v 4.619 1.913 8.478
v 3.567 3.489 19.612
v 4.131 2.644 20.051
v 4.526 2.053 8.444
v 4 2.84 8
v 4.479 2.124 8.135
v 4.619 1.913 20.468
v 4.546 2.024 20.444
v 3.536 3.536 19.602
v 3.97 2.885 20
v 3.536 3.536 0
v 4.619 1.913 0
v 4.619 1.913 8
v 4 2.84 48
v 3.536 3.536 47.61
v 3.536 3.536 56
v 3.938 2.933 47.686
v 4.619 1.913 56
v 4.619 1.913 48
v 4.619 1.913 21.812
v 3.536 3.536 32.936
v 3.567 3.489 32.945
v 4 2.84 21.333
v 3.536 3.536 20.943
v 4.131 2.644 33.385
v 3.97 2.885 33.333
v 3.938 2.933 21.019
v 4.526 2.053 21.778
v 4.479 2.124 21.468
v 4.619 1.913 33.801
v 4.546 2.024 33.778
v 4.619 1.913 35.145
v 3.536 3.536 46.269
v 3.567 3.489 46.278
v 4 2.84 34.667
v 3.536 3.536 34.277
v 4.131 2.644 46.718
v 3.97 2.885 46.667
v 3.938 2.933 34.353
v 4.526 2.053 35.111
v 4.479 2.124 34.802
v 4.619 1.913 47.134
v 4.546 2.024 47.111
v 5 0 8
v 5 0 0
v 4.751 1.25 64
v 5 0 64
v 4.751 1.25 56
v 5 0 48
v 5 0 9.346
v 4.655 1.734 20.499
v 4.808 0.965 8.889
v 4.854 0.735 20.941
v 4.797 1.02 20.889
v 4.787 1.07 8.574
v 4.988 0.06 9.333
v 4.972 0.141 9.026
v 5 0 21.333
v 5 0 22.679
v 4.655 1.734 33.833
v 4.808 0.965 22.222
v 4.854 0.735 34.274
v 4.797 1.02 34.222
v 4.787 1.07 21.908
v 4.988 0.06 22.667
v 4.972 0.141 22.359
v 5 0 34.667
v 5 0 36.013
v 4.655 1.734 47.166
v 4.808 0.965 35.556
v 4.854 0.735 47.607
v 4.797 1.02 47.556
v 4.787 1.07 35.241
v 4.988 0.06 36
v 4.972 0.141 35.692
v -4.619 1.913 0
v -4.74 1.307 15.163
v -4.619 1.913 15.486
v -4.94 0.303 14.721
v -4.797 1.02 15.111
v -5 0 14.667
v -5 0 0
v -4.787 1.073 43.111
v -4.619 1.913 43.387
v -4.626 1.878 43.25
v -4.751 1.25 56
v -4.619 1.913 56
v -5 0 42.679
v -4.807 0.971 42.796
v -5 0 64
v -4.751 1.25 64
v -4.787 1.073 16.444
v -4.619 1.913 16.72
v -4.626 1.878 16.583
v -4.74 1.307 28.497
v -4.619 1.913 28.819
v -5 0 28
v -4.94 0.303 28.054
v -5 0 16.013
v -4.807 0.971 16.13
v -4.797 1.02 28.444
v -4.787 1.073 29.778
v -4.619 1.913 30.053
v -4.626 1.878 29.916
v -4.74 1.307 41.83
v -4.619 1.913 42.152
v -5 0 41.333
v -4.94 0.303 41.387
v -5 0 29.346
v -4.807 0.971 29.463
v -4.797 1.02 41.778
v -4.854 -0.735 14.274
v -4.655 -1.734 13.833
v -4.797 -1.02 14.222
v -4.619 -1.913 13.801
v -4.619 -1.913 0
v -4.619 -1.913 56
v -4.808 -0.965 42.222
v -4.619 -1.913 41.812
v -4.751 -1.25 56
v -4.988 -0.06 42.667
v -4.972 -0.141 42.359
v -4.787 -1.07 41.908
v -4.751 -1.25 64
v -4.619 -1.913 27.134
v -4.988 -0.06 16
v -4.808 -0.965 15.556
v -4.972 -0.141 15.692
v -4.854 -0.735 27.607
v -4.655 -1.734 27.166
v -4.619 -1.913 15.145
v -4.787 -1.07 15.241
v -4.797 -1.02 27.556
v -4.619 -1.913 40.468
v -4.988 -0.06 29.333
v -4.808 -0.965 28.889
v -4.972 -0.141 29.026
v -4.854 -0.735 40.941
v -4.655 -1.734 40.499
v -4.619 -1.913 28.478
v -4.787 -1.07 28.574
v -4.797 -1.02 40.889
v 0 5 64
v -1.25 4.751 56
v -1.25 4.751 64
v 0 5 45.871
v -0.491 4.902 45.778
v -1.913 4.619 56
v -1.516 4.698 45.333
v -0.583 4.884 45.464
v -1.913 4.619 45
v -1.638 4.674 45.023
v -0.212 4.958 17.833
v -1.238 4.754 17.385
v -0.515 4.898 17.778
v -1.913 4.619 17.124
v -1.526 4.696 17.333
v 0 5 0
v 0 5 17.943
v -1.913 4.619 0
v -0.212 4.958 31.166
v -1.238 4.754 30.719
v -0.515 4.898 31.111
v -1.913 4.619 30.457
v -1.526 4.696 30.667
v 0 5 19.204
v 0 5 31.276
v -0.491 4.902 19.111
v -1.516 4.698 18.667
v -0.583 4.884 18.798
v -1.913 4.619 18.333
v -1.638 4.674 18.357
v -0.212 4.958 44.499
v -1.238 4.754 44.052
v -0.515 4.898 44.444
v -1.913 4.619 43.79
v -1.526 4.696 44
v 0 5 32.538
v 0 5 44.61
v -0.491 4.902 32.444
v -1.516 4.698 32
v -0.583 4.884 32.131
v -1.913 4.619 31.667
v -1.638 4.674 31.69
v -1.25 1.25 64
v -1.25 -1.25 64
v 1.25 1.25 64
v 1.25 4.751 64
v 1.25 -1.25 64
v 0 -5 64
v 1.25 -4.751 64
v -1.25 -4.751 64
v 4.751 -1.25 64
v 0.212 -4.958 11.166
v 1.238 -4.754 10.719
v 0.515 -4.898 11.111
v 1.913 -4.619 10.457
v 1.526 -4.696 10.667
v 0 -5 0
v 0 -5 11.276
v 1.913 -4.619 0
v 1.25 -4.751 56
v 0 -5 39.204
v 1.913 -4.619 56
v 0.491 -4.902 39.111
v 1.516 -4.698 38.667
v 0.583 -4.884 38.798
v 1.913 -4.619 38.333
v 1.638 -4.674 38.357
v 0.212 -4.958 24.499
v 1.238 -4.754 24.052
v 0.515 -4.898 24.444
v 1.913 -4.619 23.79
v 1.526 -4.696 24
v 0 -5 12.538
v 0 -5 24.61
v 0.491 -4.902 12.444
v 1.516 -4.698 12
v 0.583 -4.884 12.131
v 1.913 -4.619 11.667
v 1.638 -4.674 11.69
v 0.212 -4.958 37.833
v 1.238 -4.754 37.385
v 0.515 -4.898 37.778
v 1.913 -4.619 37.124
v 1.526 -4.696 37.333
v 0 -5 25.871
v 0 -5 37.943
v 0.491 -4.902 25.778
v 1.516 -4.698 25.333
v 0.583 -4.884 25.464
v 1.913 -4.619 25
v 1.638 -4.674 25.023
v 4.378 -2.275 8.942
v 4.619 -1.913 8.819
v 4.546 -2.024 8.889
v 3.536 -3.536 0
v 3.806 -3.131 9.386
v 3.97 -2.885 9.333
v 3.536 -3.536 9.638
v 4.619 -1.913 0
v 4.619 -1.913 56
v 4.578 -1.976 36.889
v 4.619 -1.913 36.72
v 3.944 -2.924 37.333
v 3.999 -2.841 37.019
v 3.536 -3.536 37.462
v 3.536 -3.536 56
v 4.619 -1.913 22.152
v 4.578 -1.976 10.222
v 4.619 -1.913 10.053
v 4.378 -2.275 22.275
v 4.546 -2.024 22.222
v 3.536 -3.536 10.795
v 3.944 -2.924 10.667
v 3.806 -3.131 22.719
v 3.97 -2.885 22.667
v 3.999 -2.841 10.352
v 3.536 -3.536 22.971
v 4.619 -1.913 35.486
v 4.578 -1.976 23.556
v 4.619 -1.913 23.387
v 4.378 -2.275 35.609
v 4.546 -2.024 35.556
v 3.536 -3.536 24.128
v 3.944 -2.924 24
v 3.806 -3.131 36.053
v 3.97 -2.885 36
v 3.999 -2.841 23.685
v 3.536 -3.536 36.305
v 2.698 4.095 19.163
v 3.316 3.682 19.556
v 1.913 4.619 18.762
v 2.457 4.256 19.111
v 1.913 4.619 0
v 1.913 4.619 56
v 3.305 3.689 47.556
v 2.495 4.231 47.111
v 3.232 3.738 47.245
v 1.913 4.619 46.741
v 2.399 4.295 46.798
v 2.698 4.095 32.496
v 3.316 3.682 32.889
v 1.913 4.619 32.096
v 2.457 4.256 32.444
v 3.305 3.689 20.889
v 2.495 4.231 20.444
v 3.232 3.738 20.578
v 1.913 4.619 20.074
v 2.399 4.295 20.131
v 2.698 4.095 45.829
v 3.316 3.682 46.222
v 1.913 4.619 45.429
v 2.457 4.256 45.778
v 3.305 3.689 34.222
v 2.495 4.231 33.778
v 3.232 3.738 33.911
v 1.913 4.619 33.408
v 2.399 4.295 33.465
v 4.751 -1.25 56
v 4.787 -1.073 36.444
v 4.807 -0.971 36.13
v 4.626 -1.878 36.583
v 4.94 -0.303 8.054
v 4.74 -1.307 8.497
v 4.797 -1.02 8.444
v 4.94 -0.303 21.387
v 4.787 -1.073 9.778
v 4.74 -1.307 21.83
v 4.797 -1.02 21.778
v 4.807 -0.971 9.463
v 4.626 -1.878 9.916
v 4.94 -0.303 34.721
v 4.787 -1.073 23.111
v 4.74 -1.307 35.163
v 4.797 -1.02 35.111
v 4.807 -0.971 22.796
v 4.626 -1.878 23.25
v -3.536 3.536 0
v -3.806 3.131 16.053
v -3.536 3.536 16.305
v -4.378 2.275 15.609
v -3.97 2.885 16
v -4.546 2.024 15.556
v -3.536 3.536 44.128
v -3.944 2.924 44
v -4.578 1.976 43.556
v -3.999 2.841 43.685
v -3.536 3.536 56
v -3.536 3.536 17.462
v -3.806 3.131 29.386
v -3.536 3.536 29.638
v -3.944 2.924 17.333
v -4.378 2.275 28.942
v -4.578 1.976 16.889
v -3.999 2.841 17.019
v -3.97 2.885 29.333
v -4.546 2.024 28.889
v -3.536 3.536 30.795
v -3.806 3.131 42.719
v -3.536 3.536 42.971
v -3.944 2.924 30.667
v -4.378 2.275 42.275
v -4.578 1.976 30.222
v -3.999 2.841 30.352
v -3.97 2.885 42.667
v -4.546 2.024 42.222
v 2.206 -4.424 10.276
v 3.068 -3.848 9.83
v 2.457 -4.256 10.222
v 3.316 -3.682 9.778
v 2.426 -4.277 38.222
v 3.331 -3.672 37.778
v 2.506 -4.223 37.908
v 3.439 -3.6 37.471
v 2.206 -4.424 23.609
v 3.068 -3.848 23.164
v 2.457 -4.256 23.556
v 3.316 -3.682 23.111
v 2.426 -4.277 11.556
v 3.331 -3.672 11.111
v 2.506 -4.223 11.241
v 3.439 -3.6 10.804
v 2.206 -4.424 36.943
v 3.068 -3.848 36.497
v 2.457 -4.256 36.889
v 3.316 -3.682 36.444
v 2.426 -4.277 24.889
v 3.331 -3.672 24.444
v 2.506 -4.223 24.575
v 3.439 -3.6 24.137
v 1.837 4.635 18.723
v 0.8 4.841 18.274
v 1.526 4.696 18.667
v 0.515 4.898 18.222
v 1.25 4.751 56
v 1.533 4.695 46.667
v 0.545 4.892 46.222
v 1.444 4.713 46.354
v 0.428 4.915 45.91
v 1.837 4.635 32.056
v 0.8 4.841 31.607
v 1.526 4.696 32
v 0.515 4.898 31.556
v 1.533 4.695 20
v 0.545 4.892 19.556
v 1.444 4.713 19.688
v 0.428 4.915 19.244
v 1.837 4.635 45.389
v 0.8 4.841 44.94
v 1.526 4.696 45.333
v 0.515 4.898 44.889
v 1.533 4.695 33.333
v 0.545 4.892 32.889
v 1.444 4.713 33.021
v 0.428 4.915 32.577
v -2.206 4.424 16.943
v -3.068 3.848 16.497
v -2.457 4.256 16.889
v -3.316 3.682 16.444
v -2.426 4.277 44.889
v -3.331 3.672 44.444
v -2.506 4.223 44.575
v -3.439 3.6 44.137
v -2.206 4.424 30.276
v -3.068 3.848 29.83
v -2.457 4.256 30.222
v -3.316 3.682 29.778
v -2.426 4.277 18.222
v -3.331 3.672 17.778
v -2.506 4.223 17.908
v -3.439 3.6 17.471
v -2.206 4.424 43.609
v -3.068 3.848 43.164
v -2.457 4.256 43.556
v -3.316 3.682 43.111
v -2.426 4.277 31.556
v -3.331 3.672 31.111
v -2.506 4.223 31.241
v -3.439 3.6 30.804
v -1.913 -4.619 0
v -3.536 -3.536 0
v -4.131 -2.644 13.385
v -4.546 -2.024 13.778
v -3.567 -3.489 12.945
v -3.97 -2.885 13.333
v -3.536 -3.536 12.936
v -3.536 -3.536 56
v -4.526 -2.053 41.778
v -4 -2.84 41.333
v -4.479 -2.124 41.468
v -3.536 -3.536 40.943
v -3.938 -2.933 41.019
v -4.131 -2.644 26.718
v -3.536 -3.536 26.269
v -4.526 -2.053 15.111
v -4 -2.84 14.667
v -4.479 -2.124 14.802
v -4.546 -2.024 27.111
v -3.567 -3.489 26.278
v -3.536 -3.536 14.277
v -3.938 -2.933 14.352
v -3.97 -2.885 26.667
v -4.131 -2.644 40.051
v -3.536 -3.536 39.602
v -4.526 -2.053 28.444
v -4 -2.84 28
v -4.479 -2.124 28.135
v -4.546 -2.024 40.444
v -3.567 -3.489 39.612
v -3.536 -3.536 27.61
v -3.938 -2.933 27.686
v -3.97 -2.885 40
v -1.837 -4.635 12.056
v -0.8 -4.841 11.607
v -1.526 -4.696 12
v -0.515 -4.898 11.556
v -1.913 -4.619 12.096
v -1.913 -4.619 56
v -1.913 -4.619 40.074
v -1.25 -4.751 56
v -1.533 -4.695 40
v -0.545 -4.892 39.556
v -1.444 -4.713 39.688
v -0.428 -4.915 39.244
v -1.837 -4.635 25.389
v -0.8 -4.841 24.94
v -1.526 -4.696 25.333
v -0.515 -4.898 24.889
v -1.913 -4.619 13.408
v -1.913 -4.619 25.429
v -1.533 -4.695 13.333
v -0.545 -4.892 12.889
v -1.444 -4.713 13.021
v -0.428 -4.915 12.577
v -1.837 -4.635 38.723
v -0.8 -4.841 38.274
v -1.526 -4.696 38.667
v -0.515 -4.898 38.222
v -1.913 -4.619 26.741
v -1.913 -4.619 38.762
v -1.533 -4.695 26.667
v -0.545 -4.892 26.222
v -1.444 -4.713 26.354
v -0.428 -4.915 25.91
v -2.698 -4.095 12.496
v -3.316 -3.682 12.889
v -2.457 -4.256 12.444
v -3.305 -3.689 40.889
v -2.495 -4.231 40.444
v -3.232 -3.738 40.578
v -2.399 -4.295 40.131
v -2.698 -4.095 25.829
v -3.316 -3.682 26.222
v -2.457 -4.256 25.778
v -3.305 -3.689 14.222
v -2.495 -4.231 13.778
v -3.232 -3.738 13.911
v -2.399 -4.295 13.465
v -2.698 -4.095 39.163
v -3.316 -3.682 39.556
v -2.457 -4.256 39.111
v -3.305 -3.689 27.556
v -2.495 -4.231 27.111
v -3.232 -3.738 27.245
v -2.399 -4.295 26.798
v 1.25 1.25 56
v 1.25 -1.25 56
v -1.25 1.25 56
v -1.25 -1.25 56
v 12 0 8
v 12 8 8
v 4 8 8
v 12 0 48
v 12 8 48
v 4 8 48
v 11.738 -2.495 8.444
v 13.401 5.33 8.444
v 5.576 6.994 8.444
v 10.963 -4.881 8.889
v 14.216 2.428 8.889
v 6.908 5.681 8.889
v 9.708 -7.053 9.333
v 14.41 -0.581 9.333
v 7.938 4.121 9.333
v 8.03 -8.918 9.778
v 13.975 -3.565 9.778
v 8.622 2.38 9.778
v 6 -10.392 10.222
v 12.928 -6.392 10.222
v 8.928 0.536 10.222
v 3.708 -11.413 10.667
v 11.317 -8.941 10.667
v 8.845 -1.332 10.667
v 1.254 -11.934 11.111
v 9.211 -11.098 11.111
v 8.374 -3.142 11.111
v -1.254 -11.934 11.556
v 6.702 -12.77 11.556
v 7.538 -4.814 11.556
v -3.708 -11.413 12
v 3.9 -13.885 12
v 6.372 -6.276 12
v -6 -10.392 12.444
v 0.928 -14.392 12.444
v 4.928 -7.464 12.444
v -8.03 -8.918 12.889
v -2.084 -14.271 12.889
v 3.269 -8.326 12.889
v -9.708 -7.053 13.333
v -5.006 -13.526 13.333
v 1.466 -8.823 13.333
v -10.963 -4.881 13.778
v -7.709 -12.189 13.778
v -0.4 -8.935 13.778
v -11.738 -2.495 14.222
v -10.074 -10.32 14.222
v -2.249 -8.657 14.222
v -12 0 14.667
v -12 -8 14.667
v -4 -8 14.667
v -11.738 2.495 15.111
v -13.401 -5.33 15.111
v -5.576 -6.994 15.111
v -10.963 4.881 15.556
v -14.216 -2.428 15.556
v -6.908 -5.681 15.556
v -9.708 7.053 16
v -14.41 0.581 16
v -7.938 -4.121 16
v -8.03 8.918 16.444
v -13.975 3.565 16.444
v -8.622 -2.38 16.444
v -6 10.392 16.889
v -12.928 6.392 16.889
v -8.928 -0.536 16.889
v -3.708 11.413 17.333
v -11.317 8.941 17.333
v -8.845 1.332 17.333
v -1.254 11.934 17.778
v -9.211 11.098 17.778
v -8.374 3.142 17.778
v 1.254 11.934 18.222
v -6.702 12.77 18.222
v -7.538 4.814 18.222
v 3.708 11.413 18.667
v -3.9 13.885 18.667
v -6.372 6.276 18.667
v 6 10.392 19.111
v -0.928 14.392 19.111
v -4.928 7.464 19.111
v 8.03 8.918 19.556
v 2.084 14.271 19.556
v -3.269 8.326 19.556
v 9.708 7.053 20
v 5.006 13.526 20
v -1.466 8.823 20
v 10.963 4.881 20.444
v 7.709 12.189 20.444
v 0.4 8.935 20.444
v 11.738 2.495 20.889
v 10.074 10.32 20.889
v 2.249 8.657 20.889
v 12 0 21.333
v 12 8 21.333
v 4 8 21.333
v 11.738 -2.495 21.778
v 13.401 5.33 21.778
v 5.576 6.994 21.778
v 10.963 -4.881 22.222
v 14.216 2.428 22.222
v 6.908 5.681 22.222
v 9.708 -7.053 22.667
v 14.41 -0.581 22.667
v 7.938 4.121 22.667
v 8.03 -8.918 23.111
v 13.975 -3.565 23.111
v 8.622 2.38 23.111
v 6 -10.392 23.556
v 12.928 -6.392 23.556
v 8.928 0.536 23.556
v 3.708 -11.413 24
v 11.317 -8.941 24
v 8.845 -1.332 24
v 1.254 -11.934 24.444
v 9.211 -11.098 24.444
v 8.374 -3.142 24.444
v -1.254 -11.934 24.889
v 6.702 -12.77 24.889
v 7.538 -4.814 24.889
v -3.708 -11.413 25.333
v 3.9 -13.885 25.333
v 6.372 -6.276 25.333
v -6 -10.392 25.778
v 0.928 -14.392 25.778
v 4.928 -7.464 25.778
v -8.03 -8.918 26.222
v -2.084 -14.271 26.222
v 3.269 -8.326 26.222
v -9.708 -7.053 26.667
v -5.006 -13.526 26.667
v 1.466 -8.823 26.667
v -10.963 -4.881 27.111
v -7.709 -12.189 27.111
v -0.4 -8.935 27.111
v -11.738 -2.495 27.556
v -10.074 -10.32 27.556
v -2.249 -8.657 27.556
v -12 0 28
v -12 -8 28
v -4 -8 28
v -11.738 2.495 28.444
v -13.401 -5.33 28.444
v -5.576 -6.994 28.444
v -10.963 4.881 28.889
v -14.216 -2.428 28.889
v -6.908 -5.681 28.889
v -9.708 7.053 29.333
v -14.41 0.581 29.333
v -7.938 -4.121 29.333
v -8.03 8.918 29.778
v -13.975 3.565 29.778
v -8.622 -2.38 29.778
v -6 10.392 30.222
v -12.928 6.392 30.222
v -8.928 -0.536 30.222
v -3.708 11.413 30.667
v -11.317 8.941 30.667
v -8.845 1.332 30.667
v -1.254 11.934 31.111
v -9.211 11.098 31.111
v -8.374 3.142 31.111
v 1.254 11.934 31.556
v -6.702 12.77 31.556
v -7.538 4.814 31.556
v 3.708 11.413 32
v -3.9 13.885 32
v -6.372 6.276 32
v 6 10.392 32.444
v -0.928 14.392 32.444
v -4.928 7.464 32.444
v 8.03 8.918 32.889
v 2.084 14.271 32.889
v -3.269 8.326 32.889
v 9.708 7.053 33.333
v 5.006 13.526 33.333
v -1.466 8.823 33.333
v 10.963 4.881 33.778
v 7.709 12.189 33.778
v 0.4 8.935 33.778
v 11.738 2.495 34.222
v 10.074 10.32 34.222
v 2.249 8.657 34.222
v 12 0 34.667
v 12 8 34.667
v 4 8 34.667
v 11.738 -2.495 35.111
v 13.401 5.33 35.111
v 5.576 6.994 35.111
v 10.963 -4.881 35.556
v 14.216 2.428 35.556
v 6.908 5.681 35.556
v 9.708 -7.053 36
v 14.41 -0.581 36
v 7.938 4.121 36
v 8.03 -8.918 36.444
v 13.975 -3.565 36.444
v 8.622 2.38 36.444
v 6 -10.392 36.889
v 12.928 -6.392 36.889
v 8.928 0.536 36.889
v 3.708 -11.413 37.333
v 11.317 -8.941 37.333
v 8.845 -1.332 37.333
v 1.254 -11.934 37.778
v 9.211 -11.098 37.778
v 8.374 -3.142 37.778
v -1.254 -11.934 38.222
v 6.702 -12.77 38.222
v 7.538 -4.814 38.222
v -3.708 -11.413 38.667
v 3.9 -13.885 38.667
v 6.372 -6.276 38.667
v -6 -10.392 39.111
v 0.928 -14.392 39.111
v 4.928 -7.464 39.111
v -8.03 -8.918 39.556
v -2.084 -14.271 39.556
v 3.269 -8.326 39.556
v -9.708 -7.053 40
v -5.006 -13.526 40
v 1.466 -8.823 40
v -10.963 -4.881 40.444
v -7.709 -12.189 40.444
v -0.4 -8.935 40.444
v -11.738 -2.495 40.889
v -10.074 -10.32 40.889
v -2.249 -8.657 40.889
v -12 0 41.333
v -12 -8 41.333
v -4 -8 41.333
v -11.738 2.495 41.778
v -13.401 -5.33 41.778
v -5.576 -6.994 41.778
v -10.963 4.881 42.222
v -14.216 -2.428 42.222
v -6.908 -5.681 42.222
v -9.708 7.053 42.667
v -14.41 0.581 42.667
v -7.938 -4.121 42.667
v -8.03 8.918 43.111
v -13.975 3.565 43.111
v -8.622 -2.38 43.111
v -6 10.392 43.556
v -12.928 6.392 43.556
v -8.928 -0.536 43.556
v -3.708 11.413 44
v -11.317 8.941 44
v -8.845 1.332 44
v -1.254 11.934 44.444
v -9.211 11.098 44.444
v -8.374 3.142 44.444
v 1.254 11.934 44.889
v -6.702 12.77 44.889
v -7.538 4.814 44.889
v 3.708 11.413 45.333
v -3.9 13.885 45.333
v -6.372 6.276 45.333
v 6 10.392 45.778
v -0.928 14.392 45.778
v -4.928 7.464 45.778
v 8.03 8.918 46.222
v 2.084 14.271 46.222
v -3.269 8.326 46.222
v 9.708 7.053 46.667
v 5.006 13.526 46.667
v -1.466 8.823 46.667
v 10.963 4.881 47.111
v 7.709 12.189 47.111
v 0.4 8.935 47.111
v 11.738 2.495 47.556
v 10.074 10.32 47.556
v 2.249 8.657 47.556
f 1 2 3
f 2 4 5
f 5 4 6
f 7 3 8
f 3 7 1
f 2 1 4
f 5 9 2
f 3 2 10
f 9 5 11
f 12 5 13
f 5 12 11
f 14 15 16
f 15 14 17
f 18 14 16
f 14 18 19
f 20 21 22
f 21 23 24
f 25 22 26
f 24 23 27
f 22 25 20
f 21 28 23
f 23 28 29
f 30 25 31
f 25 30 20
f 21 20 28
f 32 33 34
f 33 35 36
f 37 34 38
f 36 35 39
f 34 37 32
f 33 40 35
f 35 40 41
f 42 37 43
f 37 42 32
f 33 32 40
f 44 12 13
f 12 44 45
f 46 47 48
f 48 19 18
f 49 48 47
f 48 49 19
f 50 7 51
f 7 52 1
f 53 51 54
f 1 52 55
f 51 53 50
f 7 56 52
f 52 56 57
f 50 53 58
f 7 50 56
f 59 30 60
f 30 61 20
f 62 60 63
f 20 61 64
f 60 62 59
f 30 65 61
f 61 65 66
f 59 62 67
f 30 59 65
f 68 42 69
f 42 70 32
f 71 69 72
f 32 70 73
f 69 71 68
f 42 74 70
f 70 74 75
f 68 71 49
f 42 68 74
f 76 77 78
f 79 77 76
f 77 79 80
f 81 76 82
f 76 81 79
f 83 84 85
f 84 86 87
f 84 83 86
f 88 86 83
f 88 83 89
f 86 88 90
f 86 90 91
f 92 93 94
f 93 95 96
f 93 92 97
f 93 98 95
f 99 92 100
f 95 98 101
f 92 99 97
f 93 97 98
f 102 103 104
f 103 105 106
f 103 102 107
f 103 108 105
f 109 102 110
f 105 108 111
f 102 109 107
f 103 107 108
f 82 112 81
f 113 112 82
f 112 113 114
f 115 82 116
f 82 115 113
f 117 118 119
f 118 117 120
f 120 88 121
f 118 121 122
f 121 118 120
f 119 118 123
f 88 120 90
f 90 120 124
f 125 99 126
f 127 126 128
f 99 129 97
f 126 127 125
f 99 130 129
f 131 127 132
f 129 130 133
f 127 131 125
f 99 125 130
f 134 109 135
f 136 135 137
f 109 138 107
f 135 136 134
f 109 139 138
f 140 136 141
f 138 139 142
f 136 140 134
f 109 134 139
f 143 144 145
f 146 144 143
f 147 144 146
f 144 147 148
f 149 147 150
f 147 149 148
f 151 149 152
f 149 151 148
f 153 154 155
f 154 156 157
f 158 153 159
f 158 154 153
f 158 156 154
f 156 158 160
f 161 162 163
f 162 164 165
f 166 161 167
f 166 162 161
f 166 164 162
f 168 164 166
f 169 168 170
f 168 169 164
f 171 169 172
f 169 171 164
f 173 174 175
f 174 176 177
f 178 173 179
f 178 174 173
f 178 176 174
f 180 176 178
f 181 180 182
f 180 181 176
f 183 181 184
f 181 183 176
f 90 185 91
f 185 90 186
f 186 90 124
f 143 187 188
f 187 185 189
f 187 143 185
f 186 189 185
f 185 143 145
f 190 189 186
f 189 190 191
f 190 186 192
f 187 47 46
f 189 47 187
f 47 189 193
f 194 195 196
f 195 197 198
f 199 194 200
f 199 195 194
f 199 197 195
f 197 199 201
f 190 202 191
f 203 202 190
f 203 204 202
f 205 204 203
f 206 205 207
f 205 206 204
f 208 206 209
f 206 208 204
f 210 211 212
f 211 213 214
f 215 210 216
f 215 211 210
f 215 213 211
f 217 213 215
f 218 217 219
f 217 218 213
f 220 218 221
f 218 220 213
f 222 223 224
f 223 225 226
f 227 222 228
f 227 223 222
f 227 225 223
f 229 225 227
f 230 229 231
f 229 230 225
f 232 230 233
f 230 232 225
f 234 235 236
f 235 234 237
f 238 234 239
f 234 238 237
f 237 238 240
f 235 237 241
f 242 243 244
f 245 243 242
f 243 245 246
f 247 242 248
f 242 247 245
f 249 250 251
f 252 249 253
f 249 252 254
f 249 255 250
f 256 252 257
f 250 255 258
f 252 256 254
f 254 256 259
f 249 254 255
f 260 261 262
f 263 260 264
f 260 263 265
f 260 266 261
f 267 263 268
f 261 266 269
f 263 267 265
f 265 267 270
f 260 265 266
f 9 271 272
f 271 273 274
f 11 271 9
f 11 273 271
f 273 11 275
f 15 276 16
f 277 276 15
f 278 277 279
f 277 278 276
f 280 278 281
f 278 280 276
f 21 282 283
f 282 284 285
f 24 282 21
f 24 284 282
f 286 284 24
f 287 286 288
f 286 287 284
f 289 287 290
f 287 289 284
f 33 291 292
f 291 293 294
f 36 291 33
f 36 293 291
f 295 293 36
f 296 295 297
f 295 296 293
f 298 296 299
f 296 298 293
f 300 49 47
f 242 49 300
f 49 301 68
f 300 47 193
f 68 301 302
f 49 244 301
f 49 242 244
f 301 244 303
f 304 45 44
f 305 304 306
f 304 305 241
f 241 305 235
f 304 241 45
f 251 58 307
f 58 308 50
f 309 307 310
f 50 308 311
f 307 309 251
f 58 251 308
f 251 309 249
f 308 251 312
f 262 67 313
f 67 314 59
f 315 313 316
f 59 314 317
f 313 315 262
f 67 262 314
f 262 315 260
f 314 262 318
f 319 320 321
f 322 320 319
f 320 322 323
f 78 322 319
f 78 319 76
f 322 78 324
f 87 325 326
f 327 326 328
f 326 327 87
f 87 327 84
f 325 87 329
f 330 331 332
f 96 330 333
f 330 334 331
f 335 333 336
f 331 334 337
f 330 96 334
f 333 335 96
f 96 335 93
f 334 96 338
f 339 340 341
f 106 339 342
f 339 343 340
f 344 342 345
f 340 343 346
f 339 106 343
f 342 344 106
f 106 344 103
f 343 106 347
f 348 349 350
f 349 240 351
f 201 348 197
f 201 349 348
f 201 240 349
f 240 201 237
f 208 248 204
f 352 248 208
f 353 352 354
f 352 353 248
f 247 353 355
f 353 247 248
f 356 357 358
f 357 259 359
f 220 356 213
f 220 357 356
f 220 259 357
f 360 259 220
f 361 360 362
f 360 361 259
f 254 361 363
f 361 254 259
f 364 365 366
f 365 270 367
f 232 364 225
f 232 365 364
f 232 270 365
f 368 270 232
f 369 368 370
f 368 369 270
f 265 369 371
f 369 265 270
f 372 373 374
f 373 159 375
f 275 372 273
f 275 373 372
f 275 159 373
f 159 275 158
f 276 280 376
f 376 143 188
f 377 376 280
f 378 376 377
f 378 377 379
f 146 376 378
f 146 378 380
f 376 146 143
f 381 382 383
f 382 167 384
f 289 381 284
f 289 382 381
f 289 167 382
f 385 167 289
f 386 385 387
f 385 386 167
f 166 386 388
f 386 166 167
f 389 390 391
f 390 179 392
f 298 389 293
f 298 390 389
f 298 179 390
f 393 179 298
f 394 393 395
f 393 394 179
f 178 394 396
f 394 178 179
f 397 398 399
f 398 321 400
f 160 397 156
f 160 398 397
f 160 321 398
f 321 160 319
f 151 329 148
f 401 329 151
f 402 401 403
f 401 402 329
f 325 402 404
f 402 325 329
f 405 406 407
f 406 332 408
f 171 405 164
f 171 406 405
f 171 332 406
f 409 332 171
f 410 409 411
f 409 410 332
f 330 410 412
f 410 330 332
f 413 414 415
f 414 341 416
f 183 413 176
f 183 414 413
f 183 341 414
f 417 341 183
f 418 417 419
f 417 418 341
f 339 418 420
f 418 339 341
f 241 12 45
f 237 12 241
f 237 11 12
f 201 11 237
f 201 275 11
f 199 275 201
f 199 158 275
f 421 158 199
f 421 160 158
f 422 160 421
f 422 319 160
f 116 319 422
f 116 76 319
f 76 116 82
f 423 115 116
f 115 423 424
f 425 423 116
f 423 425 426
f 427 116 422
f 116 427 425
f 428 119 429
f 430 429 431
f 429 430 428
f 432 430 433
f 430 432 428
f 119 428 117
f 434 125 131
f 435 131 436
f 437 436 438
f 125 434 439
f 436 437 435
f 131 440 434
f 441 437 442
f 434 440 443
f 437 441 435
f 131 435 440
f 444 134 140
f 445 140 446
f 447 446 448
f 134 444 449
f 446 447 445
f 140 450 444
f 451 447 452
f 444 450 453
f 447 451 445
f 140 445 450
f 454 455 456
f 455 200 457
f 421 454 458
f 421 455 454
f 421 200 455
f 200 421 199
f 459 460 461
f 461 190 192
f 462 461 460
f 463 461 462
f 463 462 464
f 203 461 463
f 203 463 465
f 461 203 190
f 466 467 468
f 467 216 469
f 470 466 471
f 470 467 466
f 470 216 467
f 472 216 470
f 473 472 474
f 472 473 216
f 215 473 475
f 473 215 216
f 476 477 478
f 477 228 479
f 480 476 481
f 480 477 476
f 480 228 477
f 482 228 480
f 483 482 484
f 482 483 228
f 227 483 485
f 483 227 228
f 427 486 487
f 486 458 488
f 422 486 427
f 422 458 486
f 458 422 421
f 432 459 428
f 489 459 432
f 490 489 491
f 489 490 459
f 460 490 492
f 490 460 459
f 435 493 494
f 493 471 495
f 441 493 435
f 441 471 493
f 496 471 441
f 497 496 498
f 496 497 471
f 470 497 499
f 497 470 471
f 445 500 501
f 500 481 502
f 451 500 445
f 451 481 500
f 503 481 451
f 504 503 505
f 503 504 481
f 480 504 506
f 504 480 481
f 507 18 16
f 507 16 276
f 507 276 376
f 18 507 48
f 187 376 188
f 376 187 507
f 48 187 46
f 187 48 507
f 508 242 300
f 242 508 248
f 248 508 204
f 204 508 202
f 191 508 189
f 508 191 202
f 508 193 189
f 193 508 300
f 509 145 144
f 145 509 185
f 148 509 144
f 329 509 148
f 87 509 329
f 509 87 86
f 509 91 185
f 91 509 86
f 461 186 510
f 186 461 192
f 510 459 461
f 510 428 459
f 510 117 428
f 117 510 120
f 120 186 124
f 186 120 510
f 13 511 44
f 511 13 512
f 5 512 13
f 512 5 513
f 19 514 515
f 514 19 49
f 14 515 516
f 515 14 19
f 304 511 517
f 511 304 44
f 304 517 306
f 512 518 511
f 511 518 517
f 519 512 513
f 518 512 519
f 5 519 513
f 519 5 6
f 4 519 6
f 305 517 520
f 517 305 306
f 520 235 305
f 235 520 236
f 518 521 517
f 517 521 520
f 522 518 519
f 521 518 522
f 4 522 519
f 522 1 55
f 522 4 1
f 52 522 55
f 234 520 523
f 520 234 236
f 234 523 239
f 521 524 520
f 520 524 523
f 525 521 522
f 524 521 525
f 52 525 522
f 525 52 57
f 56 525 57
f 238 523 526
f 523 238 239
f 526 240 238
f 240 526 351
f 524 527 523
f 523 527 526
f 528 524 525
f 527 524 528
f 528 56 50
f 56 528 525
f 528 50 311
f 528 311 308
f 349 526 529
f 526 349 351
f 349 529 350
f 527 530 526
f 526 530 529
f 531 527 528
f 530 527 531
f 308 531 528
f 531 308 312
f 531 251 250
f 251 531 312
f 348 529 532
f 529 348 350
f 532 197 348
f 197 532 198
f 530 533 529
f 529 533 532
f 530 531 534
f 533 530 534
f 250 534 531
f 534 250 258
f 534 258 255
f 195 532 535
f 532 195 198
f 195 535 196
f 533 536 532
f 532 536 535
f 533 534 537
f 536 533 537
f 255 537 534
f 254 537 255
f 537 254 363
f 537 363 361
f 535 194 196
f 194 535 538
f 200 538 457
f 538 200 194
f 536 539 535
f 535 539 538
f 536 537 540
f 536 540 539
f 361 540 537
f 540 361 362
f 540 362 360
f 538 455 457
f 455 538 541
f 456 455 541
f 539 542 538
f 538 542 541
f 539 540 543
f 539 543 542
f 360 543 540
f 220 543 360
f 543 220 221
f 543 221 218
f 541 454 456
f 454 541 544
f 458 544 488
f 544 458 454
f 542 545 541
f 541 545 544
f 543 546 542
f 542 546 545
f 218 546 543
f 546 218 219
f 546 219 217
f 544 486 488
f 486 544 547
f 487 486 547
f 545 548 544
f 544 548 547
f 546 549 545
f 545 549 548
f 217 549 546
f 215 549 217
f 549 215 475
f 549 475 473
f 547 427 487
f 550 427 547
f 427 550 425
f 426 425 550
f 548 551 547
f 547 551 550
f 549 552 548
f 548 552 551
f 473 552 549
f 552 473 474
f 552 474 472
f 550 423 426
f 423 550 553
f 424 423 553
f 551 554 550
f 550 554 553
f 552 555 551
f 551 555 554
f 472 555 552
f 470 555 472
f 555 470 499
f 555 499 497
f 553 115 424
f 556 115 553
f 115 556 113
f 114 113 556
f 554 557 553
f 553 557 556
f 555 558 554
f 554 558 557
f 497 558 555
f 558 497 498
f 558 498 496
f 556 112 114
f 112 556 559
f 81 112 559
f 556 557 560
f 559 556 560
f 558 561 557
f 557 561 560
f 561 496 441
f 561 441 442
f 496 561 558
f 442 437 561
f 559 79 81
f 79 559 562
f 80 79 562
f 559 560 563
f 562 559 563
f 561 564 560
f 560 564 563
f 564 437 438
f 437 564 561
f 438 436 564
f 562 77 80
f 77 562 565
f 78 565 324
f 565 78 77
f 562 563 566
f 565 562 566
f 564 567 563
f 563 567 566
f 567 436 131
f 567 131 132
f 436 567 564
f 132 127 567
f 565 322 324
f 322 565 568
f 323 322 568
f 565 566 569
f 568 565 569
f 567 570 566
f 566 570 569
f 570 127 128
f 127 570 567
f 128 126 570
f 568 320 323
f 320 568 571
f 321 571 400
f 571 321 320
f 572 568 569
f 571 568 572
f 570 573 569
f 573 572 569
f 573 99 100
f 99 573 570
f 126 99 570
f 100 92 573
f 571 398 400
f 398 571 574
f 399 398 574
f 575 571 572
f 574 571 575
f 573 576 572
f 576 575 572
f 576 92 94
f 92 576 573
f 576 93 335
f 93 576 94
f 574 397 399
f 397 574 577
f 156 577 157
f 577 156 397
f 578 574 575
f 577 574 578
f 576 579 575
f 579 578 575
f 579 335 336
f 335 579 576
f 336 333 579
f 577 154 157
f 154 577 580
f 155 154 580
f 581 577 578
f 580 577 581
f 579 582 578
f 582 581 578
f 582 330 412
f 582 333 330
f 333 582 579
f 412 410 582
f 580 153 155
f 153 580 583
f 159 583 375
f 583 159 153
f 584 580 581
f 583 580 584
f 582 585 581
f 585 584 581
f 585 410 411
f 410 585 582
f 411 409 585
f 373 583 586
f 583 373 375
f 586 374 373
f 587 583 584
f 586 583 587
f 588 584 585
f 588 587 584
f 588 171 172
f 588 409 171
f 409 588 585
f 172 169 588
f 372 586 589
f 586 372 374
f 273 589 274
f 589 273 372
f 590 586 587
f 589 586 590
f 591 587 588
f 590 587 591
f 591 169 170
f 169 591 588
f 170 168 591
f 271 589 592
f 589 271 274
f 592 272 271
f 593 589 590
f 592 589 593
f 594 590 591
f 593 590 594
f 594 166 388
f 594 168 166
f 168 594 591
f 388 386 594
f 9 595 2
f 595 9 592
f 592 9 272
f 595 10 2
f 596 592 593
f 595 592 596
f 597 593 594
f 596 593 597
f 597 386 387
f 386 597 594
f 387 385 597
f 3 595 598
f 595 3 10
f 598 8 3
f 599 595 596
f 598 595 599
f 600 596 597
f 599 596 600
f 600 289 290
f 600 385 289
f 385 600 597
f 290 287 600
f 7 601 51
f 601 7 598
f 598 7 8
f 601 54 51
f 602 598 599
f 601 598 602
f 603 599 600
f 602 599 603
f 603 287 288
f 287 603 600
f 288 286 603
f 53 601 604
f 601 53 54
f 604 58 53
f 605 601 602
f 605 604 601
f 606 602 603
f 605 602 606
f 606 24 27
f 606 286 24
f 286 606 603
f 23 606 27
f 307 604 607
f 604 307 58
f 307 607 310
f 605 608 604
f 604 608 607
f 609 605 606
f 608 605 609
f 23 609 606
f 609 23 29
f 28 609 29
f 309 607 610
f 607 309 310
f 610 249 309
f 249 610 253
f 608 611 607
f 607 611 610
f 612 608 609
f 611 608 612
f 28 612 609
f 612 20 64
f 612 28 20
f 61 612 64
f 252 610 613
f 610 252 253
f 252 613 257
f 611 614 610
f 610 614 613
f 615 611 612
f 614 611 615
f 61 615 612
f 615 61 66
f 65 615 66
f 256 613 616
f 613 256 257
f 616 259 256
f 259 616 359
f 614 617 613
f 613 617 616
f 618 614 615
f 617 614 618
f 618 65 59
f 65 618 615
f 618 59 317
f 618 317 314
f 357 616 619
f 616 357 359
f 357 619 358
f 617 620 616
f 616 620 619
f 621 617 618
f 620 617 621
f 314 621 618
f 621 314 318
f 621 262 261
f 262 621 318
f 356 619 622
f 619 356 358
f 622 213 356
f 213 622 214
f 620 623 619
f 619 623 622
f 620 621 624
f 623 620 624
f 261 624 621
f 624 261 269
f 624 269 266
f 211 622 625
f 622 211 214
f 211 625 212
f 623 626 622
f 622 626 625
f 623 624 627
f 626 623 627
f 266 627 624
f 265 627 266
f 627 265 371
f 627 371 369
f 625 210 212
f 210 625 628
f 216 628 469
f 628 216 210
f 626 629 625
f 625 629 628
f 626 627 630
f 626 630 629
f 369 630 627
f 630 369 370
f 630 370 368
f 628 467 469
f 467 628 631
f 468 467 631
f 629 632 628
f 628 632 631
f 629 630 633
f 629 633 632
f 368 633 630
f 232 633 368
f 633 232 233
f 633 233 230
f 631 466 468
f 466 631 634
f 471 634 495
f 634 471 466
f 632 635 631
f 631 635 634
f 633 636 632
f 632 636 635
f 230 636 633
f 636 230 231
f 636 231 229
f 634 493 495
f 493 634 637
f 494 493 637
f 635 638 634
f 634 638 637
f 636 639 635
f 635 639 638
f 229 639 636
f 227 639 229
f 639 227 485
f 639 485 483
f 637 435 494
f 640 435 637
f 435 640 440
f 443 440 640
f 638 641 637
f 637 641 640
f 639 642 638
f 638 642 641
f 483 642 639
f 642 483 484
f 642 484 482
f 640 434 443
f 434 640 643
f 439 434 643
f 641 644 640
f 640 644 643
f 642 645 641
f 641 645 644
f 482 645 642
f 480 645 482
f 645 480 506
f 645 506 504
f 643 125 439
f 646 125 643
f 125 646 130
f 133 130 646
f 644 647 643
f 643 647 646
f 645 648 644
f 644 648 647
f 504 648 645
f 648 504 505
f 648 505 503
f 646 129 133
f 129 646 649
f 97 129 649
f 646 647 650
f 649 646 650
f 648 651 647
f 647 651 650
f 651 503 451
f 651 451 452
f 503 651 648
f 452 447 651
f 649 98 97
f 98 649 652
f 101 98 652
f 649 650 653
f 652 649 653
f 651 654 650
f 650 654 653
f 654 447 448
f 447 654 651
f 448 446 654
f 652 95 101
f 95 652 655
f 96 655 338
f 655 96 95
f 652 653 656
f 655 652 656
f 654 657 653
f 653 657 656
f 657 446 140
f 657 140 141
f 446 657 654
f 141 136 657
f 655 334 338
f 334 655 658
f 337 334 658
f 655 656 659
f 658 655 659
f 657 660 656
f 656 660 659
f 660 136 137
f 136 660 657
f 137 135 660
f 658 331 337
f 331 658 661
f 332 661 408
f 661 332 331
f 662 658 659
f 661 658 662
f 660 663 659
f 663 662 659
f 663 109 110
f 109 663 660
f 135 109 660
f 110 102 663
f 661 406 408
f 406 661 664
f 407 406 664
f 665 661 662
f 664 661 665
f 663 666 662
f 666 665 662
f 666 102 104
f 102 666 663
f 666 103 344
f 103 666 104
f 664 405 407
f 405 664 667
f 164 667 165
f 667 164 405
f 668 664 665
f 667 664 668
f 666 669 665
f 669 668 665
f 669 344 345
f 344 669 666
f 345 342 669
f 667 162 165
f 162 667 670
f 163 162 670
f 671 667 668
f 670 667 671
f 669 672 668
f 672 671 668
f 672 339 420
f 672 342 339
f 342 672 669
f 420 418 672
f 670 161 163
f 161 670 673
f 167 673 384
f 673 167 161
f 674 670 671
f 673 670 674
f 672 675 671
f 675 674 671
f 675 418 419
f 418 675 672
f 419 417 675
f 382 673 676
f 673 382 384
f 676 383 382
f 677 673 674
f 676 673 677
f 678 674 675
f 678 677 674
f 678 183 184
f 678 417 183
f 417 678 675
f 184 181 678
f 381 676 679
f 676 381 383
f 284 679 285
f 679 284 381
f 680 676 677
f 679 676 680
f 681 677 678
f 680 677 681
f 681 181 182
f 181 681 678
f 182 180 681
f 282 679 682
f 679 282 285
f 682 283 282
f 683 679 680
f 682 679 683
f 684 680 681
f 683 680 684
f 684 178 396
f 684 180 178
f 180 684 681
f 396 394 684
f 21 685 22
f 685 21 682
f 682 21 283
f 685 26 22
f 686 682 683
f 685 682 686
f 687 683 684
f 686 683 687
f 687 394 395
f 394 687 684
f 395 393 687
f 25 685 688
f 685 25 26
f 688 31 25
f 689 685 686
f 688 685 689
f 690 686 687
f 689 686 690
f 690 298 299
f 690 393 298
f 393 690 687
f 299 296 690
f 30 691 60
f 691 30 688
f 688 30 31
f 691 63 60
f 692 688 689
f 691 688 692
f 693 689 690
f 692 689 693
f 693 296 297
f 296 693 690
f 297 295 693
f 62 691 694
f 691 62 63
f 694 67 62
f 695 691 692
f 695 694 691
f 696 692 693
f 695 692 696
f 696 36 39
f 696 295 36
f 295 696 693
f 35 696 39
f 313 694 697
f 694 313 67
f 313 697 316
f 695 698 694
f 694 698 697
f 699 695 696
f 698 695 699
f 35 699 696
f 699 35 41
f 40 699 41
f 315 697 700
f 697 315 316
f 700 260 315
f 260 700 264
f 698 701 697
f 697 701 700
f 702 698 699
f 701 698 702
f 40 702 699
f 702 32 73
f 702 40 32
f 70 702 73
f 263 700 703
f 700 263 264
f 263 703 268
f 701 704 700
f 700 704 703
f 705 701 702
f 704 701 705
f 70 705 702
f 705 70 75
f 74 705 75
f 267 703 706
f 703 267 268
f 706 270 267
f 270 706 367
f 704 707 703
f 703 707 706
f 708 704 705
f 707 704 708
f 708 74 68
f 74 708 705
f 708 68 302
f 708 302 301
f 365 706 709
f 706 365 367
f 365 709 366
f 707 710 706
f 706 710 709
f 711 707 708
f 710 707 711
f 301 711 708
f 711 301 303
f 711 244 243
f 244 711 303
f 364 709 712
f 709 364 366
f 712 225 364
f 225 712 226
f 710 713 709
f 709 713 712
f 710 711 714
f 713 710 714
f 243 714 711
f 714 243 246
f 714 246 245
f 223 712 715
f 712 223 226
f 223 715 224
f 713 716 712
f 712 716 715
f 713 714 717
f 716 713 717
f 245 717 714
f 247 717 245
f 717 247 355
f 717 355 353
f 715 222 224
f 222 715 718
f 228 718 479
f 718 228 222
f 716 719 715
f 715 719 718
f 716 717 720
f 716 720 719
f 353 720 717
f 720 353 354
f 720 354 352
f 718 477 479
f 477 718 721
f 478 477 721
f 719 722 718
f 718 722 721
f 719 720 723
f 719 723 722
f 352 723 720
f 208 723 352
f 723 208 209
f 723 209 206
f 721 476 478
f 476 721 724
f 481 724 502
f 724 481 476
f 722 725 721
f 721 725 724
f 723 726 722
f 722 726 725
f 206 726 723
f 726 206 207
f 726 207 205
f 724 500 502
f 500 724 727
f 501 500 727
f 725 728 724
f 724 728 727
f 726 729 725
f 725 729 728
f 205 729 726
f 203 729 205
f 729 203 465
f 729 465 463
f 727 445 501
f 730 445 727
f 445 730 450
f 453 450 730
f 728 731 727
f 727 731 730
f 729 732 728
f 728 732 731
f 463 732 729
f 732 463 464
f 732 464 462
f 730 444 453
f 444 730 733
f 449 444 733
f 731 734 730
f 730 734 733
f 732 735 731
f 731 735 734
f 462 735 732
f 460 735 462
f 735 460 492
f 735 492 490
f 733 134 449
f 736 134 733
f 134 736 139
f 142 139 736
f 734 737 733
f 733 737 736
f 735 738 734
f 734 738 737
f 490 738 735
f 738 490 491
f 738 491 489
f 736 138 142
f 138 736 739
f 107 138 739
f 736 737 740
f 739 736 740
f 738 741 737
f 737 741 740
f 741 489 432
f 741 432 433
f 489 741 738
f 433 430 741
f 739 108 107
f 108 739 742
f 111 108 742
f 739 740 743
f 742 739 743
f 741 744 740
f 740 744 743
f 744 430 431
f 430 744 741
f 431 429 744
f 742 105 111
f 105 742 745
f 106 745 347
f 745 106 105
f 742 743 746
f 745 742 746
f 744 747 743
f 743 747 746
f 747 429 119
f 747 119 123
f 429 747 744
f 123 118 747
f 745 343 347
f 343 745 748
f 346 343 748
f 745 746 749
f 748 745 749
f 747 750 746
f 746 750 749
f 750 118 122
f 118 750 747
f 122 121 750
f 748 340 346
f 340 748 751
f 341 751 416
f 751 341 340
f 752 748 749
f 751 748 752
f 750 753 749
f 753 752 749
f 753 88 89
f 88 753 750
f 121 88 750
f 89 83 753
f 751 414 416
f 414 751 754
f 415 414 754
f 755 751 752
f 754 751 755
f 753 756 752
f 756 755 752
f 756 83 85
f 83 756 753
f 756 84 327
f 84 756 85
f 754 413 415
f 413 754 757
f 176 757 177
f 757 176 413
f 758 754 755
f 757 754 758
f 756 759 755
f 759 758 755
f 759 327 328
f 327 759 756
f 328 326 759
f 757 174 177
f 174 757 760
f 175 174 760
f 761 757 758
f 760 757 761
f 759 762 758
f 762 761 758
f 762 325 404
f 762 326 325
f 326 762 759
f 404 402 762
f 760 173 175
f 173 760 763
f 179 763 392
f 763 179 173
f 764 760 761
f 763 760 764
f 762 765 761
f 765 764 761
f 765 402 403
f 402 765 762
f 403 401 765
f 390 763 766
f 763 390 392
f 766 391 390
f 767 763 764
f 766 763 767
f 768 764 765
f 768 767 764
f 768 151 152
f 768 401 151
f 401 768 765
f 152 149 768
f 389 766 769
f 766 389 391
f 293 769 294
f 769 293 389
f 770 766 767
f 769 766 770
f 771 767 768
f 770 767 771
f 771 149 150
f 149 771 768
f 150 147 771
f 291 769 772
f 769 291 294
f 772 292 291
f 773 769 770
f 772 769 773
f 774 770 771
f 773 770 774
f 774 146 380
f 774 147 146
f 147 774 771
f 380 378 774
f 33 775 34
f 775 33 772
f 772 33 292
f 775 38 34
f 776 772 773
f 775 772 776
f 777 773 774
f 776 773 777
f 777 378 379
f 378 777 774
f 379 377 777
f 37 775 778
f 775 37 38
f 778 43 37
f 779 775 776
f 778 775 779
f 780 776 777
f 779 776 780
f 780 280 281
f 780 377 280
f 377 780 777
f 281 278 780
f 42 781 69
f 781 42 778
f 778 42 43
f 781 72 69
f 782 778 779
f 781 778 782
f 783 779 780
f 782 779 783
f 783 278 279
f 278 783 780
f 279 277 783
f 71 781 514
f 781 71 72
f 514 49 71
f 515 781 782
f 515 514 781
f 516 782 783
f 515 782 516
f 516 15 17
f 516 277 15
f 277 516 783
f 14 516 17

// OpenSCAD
union () {
	difference() {
		cylinder(r=5,h=64);
		translate([1.25, 1.25, 56]) cube([10, 10, 10]);
		translate([1.25, -11.25, 56]) cube([10, 10, 10]);
		translate([-11.25, 1.25, 56]) cube([10, 10, 10]);
		translate([-11.25, -11.25, 56]) cube([10, 10, 10]);
	}
	
	translate([0, 0, 28])
		linear_extrude(height = 40, center = true, twist = 3*360)
			translate([4, 0, 0])
				square([8,8]);
	

}
